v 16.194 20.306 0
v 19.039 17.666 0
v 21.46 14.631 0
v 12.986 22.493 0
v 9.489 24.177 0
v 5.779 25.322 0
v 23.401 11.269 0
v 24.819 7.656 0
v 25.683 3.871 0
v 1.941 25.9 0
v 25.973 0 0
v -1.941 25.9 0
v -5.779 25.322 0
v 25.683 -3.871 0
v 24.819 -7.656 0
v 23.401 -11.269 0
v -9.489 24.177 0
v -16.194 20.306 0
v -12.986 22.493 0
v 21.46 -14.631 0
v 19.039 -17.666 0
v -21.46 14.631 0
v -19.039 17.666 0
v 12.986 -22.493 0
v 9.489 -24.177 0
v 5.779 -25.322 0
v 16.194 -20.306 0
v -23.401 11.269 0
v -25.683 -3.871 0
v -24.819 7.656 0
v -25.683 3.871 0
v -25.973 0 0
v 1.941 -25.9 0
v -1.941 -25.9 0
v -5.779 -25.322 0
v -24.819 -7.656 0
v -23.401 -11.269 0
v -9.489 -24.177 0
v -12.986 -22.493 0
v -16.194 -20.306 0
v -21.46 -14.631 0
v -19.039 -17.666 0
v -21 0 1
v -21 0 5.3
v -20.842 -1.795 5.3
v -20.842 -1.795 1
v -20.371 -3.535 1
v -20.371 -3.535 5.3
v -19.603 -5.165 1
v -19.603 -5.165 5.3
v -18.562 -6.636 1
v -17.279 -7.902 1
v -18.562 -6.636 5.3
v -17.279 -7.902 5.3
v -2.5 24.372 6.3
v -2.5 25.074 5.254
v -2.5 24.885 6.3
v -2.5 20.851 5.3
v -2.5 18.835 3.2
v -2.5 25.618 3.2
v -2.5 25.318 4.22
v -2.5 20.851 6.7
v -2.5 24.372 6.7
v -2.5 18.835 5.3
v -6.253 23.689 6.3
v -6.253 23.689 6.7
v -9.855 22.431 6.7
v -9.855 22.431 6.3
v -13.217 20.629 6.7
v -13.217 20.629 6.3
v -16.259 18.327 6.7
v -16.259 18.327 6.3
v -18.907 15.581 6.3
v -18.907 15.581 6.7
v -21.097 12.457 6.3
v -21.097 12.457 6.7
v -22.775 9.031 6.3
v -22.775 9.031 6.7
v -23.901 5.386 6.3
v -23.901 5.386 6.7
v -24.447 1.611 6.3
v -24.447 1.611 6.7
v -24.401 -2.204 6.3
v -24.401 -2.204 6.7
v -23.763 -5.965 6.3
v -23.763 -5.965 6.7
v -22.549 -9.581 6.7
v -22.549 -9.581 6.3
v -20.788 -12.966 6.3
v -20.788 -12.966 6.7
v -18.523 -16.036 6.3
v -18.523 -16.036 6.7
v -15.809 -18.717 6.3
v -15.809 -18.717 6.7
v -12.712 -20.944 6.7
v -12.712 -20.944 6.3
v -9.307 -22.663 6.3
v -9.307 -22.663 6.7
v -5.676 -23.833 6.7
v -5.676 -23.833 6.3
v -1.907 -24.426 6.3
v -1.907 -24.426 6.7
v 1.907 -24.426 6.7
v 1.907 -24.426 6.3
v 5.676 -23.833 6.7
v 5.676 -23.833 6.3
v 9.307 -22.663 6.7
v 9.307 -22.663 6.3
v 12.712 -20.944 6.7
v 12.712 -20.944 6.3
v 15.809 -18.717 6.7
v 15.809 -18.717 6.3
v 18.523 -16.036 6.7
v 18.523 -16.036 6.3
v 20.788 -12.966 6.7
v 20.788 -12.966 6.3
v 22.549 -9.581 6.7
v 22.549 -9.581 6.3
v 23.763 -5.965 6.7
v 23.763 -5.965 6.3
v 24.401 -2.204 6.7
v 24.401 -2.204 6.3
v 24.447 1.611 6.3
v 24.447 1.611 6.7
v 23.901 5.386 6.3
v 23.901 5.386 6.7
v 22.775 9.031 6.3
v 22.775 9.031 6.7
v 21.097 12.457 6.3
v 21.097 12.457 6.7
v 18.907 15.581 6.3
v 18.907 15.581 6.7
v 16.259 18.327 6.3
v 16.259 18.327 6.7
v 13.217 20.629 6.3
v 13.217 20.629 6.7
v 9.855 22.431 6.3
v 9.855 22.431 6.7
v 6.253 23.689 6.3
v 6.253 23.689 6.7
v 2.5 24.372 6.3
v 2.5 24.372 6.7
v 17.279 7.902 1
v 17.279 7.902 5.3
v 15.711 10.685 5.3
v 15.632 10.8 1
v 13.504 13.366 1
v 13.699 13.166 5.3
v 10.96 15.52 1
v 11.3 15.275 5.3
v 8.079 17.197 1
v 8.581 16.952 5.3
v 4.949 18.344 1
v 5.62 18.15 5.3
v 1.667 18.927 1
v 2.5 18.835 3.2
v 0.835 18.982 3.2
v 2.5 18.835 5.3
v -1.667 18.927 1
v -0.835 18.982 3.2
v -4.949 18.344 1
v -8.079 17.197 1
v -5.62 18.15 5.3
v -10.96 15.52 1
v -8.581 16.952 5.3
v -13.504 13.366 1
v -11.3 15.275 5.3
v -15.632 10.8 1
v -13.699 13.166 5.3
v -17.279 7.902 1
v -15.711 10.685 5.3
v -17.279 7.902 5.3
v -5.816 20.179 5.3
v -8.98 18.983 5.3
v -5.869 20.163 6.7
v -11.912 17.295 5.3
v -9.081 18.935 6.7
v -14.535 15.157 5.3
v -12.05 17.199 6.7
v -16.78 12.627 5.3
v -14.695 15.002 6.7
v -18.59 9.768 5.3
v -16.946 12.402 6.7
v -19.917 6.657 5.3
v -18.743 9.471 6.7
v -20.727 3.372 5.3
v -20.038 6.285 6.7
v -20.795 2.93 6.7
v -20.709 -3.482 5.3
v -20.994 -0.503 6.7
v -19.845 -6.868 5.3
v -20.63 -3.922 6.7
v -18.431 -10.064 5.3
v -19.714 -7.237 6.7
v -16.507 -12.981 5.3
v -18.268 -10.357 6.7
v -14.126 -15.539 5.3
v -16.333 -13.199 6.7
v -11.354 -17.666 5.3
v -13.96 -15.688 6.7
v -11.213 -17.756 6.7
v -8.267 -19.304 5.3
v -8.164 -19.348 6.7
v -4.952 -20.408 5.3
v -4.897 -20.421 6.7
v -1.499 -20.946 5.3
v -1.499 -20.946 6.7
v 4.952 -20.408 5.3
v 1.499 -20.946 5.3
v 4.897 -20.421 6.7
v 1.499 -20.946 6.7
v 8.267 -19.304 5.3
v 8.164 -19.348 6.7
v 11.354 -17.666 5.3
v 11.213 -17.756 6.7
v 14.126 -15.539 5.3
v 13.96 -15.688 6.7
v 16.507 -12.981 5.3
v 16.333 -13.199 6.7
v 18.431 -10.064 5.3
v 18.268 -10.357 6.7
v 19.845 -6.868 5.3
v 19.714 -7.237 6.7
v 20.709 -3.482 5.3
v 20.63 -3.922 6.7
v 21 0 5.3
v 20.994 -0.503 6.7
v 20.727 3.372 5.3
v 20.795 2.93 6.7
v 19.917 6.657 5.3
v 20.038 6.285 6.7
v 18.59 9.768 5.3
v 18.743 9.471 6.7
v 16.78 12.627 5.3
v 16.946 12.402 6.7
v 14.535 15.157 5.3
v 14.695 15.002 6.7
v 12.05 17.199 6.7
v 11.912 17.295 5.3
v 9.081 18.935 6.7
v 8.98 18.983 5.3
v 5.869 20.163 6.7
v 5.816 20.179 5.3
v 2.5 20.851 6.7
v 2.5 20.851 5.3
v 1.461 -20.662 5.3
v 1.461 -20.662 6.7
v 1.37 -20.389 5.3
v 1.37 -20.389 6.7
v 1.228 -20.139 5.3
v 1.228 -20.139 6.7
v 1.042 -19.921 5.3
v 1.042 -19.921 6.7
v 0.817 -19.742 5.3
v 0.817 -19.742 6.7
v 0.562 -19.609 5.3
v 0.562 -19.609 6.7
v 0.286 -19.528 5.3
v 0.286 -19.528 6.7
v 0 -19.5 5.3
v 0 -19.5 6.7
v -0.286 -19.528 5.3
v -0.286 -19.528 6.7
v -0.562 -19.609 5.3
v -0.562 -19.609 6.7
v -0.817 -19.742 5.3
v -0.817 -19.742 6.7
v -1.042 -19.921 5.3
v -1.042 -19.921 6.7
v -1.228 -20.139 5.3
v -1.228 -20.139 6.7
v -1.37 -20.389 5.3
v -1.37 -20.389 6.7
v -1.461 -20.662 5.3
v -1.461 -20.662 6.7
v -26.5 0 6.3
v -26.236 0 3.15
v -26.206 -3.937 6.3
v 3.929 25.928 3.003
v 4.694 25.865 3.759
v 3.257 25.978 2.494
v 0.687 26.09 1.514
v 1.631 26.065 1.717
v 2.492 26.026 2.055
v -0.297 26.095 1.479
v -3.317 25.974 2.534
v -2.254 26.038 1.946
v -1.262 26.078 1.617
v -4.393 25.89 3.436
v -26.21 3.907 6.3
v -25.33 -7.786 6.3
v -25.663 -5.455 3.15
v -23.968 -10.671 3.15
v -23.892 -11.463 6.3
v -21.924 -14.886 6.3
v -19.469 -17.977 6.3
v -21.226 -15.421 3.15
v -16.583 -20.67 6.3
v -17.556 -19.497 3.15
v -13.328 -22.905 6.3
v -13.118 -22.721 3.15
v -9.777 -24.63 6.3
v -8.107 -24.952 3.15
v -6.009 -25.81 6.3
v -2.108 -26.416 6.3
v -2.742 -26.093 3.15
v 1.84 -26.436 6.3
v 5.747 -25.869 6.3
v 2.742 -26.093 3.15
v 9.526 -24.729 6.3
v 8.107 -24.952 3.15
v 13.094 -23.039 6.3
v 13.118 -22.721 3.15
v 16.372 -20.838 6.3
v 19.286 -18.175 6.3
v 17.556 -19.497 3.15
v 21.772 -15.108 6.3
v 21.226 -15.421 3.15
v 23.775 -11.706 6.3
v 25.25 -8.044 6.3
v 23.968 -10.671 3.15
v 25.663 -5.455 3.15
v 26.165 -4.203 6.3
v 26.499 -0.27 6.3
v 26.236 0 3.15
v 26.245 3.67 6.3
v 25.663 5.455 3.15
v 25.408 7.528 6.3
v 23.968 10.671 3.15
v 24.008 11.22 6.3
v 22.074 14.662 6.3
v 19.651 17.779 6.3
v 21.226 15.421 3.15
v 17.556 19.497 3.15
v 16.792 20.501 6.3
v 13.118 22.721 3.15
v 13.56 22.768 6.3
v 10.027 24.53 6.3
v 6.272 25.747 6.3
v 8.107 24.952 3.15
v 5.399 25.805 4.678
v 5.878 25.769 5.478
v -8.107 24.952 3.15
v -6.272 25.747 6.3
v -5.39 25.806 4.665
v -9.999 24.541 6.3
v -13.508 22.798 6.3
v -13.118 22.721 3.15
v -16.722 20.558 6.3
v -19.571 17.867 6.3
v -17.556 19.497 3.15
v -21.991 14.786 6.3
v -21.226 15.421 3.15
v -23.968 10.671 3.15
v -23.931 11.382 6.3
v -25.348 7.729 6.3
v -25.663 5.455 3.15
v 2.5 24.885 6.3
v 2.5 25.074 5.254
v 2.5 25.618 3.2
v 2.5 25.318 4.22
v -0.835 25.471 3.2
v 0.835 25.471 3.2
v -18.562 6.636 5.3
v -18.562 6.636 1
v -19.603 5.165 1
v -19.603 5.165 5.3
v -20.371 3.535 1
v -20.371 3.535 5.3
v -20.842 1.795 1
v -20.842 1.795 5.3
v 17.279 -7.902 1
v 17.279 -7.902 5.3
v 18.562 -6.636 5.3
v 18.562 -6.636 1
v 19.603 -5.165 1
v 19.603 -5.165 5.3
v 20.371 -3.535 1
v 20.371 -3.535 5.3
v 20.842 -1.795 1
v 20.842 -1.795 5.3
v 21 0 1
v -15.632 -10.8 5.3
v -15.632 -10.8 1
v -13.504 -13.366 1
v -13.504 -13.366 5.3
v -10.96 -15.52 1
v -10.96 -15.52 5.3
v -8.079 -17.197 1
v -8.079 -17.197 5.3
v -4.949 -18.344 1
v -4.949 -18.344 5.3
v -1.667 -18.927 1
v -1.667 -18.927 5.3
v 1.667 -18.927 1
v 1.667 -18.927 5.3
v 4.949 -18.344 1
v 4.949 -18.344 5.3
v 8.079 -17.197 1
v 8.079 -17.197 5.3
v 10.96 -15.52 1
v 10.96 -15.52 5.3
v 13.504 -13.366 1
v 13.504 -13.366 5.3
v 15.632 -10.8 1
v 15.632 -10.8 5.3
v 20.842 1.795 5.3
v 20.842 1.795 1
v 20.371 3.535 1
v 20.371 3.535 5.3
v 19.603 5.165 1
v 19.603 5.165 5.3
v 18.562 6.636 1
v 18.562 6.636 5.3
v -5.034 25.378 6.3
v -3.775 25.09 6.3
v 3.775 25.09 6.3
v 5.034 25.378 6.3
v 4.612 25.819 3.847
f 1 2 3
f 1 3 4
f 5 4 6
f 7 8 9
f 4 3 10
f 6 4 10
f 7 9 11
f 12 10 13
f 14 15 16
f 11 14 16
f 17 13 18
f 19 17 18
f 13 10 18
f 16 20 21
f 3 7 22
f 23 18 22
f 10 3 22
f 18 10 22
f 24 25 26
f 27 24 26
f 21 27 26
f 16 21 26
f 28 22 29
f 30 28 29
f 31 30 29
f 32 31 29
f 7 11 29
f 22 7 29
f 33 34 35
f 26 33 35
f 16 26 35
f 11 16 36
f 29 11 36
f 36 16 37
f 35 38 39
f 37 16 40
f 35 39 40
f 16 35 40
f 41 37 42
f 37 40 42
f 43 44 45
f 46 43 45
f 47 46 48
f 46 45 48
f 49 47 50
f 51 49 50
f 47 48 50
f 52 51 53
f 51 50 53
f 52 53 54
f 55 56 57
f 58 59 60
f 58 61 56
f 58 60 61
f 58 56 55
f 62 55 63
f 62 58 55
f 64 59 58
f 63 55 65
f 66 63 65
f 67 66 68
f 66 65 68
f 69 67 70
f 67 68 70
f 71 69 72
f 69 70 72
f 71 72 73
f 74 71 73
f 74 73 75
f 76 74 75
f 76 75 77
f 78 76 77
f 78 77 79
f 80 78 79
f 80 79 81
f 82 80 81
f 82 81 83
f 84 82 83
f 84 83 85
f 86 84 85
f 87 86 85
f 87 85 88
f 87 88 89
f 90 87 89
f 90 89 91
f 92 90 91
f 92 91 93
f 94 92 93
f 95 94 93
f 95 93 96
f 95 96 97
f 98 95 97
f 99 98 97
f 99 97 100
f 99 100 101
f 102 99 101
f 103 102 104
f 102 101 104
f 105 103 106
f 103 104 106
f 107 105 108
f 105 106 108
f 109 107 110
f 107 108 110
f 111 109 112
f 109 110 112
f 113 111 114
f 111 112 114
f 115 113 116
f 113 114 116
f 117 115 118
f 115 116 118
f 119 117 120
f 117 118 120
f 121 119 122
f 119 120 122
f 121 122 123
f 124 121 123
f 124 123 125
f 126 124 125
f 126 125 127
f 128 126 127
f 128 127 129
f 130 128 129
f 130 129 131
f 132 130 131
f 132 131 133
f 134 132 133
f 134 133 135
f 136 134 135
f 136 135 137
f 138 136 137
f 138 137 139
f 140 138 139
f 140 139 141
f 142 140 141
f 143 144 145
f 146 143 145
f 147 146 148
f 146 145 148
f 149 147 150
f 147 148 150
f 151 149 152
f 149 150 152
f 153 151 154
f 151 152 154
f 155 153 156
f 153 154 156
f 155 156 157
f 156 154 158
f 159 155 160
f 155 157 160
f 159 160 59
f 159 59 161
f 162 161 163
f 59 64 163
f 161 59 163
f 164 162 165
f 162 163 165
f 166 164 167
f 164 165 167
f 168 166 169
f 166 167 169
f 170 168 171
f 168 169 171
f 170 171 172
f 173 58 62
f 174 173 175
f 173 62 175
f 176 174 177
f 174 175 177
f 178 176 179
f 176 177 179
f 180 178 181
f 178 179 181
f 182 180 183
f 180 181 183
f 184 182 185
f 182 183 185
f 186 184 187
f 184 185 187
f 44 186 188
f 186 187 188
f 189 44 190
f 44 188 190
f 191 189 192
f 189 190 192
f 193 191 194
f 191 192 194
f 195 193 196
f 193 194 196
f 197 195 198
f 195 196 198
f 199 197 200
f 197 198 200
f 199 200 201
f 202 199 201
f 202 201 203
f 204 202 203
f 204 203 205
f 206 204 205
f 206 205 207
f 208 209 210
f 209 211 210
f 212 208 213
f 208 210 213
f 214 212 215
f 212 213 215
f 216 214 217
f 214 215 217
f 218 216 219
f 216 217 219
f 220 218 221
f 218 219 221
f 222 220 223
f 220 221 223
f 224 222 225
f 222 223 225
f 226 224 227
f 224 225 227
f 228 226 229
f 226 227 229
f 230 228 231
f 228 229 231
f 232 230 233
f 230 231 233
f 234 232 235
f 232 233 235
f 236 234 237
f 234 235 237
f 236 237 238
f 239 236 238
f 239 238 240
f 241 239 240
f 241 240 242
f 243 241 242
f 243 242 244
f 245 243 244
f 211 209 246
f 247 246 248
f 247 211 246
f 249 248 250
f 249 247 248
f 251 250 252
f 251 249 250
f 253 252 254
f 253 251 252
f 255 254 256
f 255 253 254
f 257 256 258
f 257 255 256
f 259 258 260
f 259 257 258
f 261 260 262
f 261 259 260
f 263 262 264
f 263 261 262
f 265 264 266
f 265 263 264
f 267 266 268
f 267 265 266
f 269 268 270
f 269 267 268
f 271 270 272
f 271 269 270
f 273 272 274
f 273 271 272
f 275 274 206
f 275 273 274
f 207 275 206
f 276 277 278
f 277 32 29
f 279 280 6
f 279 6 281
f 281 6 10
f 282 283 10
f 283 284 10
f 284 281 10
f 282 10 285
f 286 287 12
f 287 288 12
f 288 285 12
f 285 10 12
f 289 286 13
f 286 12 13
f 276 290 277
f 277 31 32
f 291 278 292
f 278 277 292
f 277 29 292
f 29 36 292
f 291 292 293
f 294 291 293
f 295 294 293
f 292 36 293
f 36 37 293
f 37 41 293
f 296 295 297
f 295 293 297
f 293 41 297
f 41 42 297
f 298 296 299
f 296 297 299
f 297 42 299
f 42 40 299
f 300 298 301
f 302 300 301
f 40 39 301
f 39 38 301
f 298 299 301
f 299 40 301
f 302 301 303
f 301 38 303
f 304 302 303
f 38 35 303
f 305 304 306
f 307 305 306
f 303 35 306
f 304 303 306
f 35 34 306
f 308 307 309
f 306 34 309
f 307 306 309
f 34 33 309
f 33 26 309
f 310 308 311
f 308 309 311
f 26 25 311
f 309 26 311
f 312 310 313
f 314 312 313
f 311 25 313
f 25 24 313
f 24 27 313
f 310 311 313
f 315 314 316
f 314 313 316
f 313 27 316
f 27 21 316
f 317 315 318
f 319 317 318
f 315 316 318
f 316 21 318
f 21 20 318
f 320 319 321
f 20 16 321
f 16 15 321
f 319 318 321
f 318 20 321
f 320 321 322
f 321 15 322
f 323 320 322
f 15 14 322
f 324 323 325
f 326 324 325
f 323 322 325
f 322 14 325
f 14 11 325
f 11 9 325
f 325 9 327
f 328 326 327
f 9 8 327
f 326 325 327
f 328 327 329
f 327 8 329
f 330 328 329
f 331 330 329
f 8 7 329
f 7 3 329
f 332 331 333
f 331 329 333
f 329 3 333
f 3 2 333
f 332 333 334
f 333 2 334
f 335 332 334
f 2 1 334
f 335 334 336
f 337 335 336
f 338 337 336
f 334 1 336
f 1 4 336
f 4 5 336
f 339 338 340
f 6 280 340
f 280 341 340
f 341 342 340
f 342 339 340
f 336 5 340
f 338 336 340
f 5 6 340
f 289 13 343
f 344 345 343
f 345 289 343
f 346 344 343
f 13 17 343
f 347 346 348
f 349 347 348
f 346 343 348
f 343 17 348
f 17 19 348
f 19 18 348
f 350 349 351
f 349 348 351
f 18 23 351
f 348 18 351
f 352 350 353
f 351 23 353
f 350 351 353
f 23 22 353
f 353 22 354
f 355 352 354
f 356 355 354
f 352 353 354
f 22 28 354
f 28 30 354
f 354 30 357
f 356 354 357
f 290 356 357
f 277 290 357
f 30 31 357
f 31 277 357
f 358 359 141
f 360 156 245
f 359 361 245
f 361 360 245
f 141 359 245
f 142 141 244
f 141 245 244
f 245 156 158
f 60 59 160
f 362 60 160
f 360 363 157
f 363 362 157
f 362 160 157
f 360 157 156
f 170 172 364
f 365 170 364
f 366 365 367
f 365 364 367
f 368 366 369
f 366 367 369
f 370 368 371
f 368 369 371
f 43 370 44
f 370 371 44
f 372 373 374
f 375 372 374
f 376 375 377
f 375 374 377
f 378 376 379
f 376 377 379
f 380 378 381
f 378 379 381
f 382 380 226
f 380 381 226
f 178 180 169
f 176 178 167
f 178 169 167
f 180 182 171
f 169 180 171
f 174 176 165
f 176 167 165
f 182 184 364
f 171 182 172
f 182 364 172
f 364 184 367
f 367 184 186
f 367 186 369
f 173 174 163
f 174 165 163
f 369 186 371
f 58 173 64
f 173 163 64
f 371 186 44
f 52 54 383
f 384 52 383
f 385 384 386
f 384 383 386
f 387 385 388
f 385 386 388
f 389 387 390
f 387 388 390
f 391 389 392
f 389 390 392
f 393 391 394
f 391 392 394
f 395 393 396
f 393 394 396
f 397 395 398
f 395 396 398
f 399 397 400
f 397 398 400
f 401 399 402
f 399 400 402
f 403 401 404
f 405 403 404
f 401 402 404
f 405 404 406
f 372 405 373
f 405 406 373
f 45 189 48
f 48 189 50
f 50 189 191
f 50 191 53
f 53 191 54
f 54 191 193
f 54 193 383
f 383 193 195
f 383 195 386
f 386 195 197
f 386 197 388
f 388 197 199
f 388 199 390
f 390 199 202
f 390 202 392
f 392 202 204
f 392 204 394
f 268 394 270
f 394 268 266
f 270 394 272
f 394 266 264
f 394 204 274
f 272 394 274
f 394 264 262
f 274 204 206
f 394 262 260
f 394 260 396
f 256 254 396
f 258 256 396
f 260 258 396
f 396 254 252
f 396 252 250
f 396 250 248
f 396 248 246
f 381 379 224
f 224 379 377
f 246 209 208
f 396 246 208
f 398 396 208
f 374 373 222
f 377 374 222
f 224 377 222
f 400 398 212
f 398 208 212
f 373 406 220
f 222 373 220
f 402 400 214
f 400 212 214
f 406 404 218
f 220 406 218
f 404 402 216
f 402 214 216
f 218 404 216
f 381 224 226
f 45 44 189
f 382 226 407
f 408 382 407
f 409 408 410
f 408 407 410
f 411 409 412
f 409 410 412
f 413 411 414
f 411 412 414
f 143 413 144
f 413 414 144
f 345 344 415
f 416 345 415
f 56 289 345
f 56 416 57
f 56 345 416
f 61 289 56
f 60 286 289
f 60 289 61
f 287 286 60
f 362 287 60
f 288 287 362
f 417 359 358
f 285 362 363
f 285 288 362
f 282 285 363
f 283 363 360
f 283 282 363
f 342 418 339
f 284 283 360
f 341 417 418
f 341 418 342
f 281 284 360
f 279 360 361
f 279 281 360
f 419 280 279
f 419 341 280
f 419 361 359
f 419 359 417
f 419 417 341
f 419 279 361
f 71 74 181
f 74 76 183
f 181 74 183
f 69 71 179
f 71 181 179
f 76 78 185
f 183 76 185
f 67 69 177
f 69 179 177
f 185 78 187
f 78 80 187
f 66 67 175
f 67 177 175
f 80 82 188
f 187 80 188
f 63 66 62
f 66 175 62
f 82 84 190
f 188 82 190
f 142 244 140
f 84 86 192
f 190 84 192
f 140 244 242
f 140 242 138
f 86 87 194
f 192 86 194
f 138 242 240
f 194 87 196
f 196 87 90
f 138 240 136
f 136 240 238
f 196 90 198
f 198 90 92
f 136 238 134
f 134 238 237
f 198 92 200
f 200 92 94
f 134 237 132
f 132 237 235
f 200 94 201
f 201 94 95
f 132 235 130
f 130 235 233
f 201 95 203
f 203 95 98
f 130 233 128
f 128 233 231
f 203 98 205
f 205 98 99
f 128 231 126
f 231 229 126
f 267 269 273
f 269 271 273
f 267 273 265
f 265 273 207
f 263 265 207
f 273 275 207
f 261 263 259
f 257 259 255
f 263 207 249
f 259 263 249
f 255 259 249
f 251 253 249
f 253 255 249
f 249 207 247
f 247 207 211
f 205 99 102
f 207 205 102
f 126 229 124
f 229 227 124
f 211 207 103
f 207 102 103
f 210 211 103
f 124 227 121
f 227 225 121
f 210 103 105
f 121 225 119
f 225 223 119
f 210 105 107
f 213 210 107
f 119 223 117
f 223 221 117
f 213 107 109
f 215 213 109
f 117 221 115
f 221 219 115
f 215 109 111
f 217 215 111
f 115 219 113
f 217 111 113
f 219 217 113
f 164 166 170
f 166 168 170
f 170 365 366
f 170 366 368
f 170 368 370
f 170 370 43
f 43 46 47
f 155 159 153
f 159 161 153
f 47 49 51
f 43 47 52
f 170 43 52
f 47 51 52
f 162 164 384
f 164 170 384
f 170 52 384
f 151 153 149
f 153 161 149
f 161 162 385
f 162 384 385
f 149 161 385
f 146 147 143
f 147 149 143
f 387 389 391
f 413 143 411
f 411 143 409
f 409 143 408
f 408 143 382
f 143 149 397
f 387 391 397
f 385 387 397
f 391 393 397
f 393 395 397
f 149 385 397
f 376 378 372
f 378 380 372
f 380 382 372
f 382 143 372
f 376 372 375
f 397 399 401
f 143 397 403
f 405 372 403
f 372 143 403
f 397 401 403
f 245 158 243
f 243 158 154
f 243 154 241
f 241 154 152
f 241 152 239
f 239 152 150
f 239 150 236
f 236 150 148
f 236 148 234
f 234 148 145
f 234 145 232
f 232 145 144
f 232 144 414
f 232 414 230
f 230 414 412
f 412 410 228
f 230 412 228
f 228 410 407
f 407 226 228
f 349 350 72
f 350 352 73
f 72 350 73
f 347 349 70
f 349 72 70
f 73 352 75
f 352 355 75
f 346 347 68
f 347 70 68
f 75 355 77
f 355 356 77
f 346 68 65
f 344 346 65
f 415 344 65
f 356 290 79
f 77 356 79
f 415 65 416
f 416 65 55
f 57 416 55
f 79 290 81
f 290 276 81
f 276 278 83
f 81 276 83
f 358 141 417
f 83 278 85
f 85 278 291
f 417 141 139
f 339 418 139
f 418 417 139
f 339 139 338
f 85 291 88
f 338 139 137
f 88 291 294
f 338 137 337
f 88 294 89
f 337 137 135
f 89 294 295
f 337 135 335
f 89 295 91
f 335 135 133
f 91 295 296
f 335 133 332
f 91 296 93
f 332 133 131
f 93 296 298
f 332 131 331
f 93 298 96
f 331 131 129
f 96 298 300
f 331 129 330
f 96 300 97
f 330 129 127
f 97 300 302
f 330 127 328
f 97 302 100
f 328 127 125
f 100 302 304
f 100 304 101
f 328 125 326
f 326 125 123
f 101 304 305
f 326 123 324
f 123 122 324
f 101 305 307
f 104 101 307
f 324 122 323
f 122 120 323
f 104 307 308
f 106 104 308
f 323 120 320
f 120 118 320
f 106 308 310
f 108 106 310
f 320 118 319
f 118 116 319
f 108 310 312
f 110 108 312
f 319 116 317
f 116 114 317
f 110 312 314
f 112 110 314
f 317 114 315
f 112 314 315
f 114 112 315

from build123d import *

# Parameters (mm, degrees)
F3_DEPTH = 4.3
F4_R     = 1.5
F5_DEPTH = 1.4
F8_W     = 5
F8_H     = 5.686849
F9_DEPTH = 26.096882


with BuildPart() as f1:
    # F0 (on Front) → F1 (revolve)
    with BuildSketch(Plane.XZ):
        Polygon((-25.972747, 0), (0, 0), (0, 1), (-19, 1), (-19, 5.3), (-21, 5.3), (-21, 6.7), (-24.5, 6.7), (-24.5, 6.3), (-26.5, 6.3), align=None)
    revolve(axis=Axis((0, 0, 0.5), (0, 0, 1)))

    # F2 (on face) → F3 (cut, through all)
    with BuildSketch(Plane.XY.offset(5.3)):
        with BuildLine():
            ThreePointArc((-17.27907, -7.901503), (-19, 0), (-17.27907, 7.901503))
            ThreePointArc((-17.27907, 7.901503), (-20.023227, 4.366894), (-21, 0))
            ThreePointArc((-21, 0), (-20.023227, -4.366895), (-17.27907, -7.901503))
        make_face()
        with BuildLine():
            ThreePointArc((21, 0), (20.023227, 4.366894), (17.27907, 7.901503))
            ThreePointArc((17.27907, 7.901503), (18.564783, 4.04337), (19, 0))
            ThreePointArc((19, 0), (18.564783, -4.04337), (17.27907, -7.901503))
            ThreePointArc((17.27907, -7.901503), (20.023227, -4.366894), (21, 0))
        make_face()
    extrude(amount=-F3_DEPTH, mode=Mode.SUBTRACT)

    # F4 (on face) → F5 (join, through all)
    with BuildSketch(Plane.XY.offset(6.7)):
        with Locations((0, -21)):
            Circle(F4_R)
    extrude(amount=-F5_DEPTH)

    # F6 (on Right) → F7 (revolve, cut)
    with BuildSketch(Plane.YZ):
        with BuildLine():
            Line((44.5, -10.7), (44.5, 29.3))
            ThreePointArc((44.5, 29.3), (24.5, 9.3), (44.5, -10.7))
        make_face()
    revolve(axis=Axis((0, 44.5, 14.897466), (0, 0, 1)), mode=Mode.SUBTRACT)

    # F8 (on Front) → F9 (cut, through all)
    with BuildSketch(Plane.XZ):
        with Locations((0, 6.043424)):
            Rectangle(F8_W, F8_H)
    extrude(amount=-F9_DEPTH, mode=Mode.SUBTRACT)


solid = f1.part
